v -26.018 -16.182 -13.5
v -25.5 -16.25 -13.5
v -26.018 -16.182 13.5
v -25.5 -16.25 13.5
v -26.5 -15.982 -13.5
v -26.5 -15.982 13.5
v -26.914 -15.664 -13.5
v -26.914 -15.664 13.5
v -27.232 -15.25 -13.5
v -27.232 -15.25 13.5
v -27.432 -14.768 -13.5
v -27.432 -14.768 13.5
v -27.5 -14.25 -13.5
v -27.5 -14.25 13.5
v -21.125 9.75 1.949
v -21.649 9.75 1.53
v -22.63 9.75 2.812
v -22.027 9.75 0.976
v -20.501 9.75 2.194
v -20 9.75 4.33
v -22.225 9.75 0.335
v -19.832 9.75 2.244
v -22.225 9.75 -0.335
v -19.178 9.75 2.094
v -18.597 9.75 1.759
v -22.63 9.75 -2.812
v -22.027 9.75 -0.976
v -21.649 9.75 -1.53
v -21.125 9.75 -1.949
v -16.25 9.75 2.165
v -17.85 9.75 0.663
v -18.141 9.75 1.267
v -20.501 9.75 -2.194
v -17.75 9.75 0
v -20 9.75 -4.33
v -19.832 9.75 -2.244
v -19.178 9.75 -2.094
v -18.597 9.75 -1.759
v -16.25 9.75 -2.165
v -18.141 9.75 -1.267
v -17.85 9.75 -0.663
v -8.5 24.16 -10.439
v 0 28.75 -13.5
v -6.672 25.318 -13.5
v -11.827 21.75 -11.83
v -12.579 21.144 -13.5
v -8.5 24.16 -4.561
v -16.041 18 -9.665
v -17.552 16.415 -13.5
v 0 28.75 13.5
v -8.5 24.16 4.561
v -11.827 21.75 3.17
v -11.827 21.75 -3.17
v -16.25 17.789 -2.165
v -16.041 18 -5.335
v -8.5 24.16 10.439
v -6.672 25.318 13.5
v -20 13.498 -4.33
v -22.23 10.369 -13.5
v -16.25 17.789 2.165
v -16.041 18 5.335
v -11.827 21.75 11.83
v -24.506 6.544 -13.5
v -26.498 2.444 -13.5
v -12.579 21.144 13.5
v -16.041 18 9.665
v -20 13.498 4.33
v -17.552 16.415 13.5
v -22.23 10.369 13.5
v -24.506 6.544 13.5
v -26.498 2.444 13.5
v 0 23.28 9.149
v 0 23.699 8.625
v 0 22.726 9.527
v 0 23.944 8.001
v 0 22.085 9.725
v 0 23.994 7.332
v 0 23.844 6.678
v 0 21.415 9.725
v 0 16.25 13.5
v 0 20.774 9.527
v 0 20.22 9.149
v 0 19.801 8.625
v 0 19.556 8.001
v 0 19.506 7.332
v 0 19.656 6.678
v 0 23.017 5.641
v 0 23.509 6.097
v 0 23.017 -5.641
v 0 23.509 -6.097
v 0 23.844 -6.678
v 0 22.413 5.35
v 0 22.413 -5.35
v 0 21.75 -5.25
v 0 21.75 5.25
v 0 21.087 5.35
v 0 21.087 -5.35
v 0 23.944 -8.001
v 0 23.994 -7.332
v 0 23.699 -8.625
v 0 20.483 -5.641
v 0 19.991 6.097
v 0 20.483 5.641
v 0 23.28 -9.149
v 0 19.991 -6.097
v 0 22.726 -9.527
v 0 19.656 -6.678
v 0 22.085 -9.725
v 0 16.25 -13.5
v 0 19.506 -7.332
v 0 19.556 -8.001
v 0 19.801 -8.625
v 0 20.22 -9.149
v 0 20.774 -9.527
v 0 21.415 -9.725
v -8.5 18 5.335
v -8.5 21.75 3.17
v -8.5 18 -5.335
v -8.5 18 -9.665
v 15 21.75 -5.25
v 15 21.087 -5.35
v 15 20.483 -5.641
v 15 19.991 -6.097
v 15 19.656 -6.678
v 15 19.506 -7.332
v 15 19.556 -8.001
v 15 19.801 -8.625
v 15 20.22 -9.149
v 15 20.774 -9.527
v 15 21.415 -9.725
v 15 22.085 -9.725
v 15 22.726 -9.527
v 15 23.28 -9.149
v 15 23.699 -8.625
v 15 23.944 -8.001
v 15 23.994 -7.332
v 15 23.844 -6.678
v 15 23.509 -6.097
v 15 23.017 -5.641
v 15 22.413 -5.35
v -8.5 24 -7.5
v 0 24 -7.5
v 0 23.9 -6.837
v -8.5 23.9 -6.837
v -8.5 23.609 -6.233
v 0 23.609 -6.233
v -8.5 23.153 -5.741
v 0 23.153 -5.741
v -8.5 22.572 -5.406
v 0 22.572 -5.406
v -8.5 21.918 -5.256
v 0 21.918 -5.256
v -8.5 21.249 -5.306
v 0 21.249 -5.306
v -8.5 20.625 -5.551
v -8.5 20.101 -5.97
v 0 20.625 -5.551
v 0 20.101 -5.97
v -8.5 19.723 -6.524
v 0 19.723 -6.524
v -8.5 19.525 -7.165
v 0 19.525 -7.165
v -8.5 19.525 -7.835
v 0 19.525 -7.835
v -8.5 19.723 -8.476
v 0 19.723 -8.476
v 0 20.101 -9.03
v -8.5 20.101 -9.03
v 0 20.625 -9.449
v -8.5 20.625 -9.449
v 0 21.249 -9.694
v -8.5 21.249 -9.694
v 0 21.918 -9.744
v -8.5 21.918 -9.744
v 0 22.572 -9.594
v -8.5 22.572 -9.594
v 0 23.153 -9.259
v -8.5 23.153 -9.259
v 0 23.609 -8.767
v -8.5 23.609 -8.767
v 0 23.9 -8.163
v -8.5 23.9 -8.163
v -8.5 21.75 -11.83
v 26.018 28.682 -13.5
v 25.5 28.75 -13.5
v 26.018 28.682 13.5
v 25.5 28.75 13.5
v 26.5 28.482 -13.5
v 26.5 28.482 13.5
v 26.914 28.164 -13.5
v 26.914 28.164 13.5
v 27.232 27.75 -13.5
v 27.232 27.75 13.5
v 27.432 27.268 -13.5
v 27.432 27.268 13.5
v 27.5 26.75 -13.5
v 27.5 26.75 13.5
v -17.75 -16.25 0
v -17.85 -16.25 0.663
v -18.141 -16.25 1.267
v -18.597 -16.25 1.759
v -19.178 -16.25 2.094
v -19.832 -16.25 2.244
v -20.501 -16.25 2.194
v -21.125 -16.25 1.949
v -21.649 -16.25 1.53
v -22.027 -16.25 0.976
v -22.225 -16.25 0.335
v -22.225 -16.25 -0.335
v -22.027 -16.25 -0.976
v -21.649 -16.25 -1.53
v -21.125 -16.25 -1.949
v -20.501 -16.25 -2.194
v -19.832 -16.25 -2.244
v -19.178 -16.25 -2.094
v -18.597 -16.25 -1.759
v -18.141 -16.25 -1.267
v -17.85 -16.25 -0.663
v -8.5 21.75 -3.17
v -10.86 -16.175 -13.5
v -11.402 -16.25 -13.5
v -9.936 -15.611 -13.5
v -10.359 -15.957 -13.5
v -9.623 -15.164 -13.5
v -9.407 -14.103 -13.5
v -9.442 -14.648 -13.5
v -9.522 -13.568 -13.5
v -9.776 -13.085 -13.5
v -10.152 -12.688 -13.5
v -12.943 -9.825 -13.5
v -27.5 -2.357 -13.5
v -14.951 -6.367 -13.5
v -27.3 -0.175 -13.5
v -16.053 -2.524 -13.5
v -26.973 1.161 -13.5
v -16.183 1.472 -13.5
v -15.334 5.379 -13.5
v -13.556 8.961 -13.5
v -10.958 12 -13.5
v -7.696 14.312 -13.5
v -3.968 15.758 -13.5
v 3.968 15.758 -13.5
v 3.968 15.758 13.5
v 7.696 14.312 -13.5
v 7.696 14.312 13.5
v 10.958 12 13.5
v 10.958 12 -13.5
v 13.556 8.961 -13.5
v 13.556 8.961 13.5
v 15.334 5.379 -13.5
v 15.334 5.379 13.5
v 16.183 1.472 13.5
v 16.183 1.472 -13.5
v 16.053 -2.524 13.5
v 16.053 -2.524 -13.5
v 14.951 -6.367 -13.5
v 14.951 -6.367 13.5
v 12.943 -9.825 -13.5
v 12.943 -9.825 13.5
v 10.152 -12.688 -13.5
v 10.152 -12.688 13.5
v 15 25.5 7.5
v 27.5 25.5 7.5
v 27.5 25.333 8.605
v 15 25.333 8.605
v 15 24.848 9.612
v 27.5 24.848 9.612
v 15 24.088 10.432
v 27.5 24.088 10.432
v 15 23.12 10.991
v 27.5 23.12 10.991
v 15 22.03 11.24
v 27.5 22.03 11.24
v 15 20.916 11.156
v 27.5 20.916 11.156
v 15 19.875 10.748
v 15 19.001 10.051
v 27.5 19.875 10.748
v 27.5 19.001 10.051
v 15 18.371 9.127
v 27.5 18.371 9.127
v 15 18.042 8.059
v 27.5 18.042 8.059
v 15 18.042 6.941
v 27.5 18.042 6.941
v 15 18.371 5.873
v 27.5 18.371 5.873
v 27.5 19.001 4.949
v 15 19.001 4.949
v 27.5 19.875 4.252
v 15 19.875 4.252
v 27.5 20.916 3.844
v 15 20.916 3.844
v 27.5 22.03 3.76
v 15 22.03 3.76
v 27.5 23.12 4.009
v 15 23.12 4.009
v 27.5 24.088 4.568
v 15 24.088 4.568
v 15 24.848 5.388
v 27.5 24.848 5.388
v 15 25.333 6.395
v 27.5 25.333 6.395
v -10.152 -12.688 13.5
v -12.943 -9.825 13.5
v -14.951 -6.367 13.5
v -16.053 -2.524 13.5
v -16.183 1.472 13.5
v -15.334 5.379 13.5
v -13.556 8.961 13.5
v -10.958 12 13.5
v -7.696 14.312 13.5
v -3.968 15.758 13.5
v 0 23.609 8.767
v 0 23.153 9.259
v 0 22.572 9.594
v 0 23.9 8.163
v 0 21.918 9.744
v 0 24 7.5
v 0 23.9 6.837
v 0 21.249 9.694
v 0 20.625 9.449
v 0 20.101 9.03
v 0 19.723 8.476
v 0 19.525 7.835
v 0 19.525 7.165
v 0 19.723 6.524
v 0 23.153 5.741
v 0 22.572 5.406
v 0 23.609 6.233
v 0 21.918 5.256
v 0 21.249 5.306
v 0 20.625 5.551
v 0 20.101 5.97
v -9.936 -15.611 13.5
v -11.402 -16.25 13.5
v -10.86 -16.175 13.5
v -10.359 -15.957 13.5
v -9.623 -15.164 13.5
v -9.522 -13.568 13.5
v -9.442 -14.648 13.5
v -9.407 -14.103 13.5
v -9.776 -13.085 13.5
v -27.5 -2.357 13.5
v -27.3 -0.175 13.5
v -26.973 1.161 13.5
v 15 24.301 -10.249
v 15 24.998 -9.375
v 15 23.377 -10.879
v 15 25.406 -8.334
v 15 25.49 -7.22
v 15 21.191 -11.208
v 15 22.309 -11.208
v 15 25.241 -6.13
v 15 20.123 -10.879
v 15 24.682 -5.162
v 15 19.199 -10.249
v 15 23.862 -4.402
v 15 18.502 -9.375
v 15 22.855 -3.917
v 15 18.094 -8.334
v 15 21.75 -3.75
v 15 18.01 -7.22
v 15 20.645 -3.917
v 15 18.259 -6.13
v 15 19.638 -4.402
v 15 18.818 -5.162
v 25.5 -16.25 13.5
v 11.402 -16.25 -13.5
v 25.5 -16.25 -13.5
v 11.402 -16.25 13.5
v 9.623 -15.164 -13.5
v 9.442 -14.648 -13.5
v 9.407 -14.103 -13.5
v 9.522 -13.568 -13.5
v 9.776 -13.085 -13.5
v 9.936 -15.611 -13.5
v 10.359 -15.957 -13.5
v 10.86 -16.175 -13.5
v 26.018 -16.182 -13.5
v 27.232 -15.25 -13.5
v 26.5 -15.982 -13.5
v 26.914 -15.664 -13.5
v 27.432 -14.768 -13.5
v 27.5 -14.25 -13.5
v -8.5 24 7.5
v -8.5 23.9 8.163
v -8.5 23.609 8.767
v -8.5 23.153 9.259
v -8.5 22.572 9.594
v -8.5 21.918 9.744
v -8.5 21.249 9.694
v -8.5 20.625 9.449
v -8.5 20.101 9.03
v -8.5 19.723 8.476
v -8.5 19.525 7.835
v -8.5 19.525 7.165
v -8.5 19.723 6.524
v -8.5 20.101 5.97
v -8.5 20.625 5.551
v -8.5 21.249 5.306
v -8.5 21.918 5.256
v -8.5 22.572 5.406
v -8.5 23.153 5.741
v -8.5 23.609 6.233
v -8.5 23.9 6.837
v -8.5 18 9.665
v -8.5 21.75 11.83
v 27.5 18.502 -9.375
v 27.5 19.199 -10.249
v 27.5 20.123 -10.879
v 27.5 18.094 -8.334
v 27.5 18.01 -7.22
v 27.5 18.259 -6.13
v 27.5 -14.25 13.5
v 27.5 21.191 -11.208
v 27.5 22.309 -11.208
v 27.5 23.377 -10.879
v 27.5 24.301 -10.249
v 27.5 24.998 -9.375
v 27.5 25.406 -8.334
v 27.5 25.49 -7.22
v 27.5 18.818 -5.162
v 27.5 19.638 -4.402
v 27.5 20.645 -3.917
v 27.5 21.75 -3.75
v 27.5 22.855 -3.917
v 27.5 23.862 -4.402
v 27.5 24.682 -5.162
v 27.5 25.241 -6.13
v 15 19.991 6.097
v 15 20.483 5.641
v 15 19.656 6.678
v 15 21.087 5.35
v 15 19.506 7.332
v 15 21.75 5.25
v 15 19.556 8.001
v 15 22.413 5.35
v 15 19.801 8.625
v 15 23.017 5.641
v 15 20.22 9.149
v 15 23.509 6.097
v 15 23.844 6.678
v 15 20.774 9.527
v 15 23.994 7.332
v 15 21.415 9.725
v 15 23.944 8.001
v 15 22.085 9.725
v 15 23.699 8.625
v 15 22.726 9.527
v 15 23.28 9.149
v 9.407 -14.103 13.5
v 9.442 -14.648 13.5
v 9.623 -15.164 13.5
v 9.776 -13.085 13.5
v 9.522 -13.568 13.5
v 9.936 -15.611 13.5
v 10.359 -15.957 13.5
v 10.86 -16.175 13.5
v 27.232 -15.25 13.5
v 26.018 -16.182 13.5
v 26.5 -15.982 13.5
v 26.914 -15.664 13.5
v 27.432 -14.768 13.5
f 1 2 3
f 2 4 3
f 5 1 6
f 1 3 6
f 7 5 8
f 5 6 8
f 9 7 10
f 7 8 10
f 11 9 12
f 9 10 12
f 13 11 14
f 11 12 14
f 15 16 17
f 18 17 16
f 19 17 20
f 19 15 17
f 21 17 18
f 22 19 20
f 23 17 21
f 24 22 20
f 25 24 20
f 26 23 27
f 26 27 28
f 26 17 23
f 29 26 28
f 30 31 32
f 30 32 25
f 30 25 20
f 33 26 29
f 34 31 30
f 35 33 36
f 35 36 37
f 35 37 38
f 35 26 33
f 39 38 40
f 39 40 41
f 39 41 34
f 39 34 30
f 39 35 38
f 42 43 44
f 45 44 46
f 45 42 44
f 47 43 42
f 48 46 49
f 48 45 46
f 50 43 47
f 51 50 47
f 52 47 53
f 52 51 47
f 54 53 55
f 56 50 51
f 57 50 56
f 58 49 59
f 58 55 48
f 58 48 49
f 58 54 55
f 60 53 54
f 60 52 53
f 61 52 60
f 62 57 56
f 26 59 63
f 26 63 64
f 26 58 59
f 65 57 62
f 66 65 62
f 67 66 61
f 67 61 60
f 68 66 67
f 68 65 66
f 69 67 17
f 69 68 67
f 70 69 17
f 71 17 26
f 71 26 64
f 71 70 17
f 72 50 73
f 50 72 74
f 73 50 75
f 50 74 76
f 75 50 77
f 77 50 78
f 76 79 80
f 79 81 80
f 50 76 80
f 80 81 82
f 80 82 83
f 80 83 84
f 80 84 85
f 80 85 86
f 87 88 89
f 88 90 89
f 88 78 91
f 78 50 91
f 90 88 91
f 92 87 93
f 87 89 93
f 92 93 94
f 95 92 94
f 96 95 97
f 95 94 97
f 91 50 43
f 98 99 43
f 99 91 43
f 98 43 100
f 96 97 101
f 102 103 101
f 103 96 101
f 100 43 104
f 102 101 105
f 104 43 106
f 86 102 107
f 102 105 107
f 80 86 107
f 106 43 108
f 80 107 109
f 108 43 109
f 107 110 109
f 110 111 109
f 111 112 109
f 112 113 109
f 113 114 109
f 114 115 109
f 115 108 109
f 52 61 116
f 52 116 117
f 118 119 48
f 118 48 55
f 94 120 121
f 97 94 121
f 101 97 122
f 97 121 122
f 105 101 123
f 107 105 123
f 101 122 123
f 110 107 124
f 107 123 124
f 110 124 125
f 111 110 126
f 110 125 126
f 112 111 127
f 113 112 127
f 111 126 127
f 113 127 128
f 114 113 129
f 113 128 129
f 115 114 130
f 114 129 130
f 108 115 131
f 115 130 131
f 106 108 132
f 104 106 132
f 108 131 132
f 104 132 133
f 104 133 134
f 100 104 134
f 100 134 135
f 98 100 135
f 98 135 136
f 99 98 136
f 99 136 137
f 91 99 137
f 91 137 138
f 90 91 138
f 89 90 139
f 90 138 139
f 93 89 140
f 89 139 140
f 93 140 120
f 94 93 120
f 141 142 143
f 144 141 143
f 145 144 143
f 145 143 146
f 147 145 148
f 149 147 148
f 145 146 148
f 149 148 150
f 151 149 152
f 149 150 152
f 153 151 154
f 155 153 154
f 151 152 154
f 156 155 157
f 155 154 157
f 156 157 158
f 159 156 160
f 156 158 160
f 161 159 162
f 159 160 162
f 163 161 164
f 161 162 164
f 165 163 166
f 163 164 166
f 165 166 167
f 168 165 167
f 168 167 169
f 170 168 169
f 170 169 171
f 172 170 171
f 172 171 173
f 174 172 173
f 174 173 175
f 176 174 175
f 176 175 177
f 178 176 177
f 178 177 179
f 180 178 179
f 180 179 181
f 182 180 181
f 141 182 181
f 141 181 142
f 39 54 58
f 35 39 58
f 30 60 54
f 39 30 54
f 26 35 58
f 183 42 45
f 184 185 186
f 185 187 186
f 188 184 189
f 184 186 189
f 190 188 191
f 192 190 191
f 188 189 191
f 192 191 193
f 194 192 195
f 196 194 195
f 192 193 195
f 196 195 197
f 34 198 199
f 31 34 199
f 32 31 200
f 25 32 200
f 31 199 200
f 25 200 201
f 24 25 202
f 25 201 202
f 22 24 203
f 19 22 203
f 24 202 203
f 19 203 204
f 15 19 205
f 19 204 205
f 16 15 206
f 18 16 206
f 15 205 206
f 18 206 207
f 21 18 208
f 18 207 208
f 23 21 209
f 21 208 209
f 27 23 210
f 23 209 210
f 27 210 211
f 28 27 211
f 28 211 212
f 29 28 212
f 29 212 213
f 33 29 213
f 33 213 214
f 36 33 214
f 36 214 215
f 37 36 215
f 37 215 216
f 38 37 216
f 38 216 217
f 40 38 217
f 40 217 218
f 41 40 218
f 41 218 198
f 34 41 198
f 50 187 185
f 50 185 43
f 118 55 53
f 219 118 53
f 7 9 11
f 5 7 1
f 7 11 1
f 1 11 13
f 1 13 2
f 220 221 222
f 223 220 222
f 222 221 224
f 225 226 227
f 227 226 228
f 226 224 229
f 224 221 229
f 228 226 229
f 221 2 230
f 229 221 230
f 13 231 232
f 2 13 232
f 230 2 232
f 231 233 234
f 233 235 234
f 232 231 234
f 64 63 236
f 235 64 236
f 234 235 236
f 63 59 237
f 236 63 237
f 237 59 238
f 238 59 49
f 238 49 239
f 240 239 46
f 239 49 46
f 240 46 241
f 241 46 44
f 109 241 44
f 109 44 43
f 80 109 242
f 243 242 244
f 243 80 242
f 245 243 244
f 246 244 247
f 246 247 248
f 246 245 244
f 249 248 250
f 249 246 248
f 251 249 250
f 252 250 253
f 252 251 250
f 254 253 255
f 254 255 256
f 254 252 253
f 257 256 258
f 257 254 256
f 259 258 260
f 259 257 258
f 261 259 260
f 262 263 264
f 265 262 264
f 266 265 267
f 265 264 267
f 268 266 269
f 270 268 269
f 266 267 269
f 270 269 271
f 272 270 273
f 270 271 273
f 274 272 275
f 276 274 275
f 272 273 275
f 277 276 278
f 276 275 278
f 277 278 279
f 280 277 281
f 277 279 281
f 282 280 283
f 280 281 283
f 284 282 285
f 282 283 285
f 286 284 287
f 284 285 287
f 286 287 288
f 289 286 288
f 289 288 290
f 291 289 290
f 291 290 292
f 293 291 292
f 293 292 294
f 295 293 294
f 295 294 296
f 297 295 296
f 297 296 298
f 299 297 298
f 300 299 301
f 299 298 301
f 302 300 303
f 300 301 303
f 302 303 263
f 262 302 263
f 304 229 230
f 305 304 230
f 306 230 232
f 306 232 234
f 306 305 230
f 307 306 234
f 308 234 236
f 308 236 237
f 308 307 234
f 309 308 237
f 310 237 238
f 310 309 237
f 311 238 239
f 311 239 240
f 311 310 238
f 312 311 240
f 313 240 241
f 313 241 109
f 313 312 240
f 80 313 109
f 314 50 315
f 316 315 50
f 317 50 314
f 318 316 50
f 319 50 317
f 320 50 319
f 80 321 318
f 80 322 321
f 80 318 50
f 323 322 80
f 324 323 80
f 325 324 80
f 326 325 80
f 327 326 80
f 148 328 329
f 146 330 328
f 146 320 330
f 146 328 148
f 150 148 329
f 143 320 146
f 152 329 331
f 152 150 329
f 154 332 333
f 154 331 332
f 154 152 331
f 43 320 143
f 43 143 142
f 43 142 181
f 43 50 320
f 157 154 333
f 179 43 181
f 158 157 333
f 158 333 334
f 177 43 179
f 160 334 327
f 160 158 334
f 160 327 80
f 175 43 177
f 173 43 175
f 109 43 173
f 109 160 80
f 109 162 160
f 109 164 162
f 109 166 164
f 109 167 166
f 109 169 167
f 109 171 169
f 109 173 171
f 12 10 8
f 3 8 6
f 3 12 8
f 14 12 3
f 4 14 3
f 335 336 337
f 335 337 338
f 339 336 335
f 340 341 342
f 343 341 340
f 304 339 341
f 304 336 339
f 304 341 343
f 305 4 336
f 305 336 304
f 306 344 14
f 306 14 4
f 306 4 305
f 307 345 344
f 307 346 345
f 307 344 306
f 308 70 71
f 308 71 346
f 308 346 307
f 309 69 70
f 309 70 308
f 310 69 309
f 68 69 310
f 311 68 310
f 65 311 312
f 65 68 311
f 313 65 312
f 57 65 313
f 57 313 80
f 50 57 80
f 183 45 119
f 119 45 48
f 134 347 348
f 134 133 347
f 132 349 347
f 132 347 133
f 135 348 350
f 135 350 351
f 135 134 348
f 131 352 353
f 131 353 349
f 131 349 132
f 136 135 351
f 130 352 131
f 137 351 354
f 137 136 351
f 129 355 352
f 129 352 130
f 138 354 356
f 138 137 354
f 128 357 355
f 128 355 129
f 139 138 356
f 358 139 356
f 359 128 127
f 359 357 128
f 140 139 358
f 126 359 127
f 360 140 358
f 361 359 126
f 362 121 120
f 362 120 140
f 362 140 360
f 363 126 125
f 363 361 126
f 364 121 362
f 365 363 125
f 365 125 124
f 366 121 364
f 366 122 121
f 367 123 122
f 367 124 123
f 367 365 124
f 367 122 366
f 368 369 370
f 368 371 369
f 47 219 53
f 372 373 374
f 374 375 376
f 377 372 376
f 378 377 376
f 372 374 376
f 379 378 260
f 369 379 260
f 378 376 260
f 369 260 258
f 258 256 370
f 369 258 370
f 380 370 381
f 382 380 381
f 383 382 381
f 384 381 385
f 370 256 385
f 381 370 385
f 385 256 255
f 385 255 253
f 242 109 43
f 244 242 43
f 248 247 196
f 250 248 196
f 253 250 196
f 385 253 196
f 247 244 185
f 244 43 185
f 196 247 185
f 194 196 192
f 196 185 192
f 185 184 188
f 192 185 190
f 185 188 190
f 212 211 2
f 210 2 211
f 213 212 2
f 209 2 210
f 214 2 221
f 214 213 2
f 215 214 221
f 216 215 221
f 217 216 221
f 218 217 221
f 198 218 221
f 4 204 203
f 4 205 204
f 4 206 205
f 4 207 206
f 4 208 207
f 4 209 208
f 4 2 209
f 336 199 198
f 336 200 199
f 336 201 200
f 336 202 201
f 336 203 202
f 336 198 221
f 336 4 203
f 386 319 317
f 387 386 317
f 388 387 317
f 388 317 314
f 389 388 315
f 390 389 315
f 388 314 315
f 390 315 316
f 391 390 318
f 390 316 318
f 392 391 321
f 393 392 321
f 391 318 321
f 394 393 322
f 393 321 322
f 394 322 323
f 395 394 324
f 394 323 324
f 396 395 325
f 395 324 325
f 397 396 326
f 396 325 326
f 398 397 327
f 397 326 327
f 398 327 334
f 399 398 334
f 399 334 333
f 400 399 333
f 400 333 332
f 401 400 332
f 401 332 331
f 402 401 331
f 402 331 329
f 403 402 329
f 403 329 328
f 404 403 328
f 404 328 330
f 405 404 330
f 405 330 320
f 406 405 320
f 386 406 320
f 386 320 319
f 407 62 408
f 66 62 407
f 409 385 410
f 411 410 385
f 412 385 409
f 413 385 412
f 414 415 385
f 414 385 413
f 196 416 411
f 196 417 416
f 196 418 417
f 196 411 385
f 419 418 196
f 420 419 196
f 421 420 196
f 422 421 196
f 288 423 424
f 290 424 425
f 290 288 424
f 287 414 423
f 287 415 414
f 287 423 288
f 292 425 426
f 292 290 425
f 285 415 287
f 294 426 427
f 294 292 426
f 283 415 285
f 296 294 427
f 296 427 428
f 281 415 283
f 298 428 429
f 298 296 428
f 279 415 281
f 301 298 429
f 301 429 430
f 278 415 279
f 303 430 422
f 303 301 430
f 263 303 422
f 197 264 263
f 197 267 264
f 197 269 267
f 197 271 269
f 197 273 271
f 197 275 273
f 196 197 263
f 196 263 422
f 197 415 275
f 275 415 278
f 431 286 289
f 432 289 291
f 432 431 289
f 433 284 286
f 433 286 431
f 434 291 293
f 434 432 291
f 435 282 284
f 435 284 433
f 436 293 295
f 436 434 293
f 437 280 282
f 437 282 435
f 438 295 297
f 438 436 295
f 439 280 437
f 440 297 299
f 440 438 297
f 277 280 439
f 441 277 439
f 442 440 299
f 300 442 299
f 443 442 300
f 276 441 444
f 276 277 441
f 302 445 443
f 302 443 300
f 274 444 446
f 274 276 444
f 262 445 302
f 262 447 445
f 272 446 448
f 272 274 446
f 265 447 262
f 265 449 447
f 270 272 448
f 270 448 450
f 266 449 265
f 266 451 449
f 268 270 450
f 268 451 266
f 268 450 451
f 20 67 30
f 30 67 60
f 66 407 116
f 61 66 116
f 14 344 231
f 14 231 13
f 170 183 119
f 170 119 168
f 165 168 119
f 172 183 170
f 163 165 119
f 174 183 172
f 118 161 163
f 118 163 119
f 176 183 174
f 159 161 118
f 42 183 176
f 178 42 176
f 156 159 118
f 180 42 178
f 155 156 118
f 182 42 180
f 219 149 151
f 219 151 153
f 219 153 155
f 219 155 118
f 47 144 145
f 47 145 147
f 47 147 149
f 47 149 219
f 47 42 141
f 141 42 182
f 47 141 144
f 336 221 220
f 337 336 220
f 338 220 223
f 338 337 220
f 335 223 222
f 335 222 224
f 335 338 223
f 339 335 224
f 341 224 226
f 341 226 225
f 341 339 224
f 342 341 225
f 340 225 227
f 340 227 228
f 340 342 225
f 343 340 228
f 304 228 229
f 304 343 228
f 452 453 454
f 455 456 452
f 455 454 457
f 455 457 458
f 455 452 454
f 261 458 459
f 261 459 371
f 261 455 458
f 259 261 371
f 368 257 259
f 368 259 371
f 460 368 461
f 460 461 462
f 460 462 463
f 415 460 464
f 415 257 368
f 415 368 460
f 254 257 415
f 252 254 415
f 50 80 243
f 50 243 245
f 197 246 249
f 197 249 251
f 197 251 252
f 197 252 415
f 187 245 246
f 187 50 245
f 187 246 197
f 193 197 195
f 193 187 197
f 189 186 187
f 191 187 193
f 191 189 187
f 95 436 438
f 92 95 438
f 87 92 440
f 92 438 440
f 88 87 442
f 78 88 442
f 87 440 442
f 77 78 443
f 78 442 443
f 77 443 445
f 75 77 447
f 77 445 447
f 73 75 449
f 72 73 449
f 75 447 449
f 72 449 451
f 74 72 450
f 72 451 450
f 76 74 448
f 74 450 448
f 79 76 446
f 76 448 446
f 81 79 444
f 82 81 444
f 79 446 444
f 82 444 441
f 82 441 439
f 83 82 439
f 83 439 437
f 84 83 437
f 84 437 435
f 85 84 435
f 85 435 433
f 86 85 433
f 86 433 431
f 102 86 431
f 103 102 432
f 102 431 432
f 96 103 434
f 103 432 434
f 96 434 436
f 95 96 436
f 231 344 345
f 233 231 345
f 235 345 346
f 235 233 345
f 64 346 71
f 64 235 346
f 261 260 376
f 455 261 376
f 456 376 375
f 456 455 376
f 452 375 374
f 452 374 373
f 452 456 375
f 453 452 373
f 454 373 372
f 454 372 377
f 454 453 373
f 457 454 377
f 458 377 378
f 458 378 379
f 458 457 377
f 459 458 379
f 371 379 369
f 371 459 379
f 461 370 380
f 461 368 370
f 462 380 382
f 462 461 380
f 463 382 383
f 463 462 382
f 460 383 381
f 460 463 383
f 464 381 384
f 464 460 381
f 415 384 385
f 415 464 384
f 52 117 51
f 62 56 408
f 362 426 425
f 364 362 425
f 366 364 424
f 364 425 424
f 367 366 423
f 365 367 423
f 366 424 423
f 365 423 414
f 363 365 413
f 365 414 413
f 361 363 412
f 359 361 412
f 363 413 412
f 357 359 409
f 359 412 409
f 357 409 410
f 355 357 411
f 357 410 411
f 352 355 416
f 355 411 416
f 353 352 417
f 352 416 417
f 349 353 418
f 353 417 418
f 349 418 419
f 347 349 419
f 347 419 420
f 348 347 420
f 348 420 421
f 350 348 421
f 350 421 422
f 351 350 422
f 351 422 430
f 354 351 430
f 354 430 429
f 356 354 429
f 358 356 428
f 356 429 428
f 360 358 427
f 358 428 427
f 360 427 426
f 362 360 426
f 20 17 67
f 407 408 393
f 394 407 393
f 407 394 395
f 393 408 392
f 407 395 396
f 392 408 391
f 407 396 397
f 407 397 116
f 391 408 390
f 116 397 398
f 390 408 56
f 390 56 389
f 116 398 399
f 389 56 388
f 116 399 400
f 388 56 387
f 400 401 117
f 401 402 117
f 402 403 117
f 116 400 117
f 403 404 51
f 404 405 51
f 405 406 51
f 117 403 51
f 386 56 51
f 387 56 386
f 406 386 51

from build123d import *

# Parameters (mm, degrees)
BOSS_EXTRUDE1_DEPTH    = 13.5
FILLET1_R              = 2
SPLIT1_SURFACE_1_BACK  = 77.02
SPLIT1_SURFACE_1_DEPTH = 154.04
SPLIT1_SURFACE_2_BACK  = 77.02
SPLIT1_SURFACE_2_DEPTH = 154.04
SKETCH3_R              = 3.75
CUT_EXTRUDE1_DEPTH     = 12.5
SKETCH7_R              = 2.25
CUT_EXTRUDE3_DEPTH     = 15
CUT_EXTRUDE2_DEPTH     = 27
FILLET2_R              = 12
SKETCH8_R              = 2.25
CUT_EXTRUDE4_DEPTH     = 27.5
CUT_EXTRUDE5_DEPTH     = 19
SKETCH10_R             = 2.25
CUT_EXTRUDE6_DEPTH     = 35
CUT_EXTRUDE7_DEPTH     = 19


with BuildPart() as part:
    # Sketch1 → Boss-Extrude1 (new, symmetric)
    with BuildSketch(Plane.XY):
        with BuildLine():
            Line((11.401754251, -16.25), (27.5, -16.25))
            Line((27.5, -16.25), (27.5, 28.75))
            Line((27.5, 28.75), (-27.5, 28.75))
            Line((-27.5, 28.75), (-27.5, -16.25))
            Line((-27.5, -16.25), (-11.401754251, -16.25))
            ThreePointArc((-11.401754251, -16.25), (-9.514522459, -14.912084711), (-10.152246936, -12.688356164))
            ThreePointArc((-10.152246936, -12.688356164), (0, 16.25), (10.152246936, -12.688356164))
            ThreePointArc((10.152246936, -12.688356164), (9.514522459, -14.912084711), (11.401754251, -16.25))
        make_face()
    extrude(amount=BOSS_EXTRUDE1_DEPTH, both=True)

    # Fillet1
    fillet1_edges = [part.edges().sort_by_distance(p)[0] for p in [
        (27.5, 28.75, 0),
        (27.5, -16.25, 0),
        (-27.5, -16.25, 0),
    ]]
    fillet(fillet1_edges, radius=FILLET1_R)


with BuildPart() as body_2:
    # Split1: the piece behind the surface
    add(part.part)
    # Split1 surface: a surface, the sketch's curves swept straight by 154.04 mm
    with BuildLine(Plane.XY.offset(13.5).offset(-SPLIT1_SURFACE_1_BACK), mode=Mode.PRIVATE) as split1_surface_1_path:
        Line((0, 28.75), (0, 0))
    split1_surface_1 = Shell.extrude(split1_surface_1_path.wire(), (0 * SPLIT1_SURFACE_1_DEPTH, 0 * SPLIT1_SURFACE_1_DEPTH, 1 * SPLIT1_SURFACE_1_DEPTH))
    split(bisect_by=split1_surface_1, keep=Keep.BOTTOM)

    # Sketch6 → Cut-Extrude2 (cut)
    with BuildSketch(Plane.XY.offset(13.5)):
        with BuildLine():
            Line((-27.5, 28.75), (-27.5, 0))
            add(Edge.make_bspline(
                [(0, 28.75), (-19.739323264, 20.184554889), (-27.5, 0)],
                knots=[0, 0, 0, 1, 1, 1], degree=2))
            Line((0, 28.75), (-27.5, 28.75))
        make_face()
    extrude(amount=-CUT_EXTRUDE2_DEPTH, mode=Mode.SUBTRACT)

    # Fillet2
    fillet2_edges = [body_2.edges().sort_by_distance(p)[0] for p in [
        (-27.5, 0, 0),
    ]]
    fillet(fillet2_edges, radius=FILLET2_R)

    # Sketch8 → Cut-Extrude4 (cut)
    with BuildSketch(Plane(origin=(0, 0, 0), x_dir=(0, 0, -1), z_dir=(1, 0, 0))):
        with Locations(Location((7.5, 21.75, 0), (0, 0, 90))):
            Circle(SKETCH8_R)
        with Locations(Location((-7.5, 21.75, 0), (0, 0, 90))):
            Circle(SKETCH8_R)
    extrude(amount=-CUT_EXTRUDE4_DEPTH, mode=Mode.SUBTRACT)

    # Sketch9 → Cut-Extrude5 (cut)
    with BuildSketch(Plane.ZY.offset(27.5)):
        Polygon((-5.334936491, 25.5), (-9.665063509, 25.5), (-11.830127019, 21.75), (-9.665063509, 18), (-5.334936491, 18), (-3.169872981, 21.75), align=None)
        Polygon((3.169872981, 21.75), (5.334936491, 25.5), (9.665063509, 25.5), (11.830127019, 21.75), (9.665063509, 18), (5.334936491, 18), align=None)
    extrude(amount=-CUT_EXTRUDE5_DEPTH, mode=Mode.SUBTRACT)

    # Sketch10 → Cut-Extrude6 (cut)
    with BuildSketch(Plane.XZ.offset(16.25)):
        with Locations((-20, 0)):
            Circle(SKETCH10_R)
    extrude(amount=-CUT_EXTRUDE6_DEPTH, mode=Mode.SUBTRACT)

    # Sketch11 → Cut-Extrude7 (cut)
    with BuildSketch(Plane(origin=(0, 28.75, 0), x_dir=(1, 0, 0), z_dir=(0, 1, 0))):
        Polygon((-16.25, -2.165063509), (-16.25, 2.165063509), (-20, 4.330127019), (-23.75, 2.165063509), (-23.75, -2.165063509), (-20, -4.330127019), align=None)
    extrude(amount=-CUT_EXTRUDE7_DEPTH, mode=Mode.SUBTRACT)


with BuildPart() as part_1:
    add(part.part)

    # Split1: split by a surface, the side it looks to stays
    # Split1 surface: a surface, the sketch's curves swept straight by 154.04 mm
    with BuildLine(Plane.XY.offset(13.5).offset(-SPLIT1_SURFACE_2_BACK), mode=Mode.PRIVATE) as split1_surface_2_path:
        Line((0, 28.75), (0, 0))
    split1_surface_2 = Shell.extrude(split1_surface_2_path.wire(), (0 * SPLIT1_SURFACE_2_DEPTH, 0 * SPLIT1_SURFACE_2_DEPTH, 1 * SPLIT1_SURFACE_2_DEPTH))
    split(bisect_by=split1_surface_2, keep=Keep.TOP)

    # Sketch3 → Cut-Extrude1 (cut)
    with BuildSketch(Plane(origin=(27.5, 0, 0), x_dir=(0, 0, -1), z_dir=(1, 0, 0))):
        with Locations(Location((-7.5, 21.75, 0), (0, 0, 90))):
            Circle(SKETCH3_R)
        with Locations(Location((7.5, 21.75, 0), (0, 0, 180))):
            Circle(SKETCH3_R)
    extrude(amount=-CUT_EXTRUDE1_DEPTH, mode=Mode.SUBTRACT)

    # Sketch7 → Cut-Extrude3 (cut)
    with BuildSketch(Plane(origin=(15, 0, 0), x_dir=(0, 0, -1), z_dir=(1, 0, 0))):
        with Locations((-7.5, 21.75)):
            Circle(SKETCH7_R)
        with Locations(Location((7.5, 21.75, 0), (0, 0, 180))):
            Circle(SKETCH7_R)
    extrude(amount=-CUT_EXTRUDE3_DEPTH, mode=Mode.SUBTRACT)


solid = Compound([body_2.part, part_1.part])
